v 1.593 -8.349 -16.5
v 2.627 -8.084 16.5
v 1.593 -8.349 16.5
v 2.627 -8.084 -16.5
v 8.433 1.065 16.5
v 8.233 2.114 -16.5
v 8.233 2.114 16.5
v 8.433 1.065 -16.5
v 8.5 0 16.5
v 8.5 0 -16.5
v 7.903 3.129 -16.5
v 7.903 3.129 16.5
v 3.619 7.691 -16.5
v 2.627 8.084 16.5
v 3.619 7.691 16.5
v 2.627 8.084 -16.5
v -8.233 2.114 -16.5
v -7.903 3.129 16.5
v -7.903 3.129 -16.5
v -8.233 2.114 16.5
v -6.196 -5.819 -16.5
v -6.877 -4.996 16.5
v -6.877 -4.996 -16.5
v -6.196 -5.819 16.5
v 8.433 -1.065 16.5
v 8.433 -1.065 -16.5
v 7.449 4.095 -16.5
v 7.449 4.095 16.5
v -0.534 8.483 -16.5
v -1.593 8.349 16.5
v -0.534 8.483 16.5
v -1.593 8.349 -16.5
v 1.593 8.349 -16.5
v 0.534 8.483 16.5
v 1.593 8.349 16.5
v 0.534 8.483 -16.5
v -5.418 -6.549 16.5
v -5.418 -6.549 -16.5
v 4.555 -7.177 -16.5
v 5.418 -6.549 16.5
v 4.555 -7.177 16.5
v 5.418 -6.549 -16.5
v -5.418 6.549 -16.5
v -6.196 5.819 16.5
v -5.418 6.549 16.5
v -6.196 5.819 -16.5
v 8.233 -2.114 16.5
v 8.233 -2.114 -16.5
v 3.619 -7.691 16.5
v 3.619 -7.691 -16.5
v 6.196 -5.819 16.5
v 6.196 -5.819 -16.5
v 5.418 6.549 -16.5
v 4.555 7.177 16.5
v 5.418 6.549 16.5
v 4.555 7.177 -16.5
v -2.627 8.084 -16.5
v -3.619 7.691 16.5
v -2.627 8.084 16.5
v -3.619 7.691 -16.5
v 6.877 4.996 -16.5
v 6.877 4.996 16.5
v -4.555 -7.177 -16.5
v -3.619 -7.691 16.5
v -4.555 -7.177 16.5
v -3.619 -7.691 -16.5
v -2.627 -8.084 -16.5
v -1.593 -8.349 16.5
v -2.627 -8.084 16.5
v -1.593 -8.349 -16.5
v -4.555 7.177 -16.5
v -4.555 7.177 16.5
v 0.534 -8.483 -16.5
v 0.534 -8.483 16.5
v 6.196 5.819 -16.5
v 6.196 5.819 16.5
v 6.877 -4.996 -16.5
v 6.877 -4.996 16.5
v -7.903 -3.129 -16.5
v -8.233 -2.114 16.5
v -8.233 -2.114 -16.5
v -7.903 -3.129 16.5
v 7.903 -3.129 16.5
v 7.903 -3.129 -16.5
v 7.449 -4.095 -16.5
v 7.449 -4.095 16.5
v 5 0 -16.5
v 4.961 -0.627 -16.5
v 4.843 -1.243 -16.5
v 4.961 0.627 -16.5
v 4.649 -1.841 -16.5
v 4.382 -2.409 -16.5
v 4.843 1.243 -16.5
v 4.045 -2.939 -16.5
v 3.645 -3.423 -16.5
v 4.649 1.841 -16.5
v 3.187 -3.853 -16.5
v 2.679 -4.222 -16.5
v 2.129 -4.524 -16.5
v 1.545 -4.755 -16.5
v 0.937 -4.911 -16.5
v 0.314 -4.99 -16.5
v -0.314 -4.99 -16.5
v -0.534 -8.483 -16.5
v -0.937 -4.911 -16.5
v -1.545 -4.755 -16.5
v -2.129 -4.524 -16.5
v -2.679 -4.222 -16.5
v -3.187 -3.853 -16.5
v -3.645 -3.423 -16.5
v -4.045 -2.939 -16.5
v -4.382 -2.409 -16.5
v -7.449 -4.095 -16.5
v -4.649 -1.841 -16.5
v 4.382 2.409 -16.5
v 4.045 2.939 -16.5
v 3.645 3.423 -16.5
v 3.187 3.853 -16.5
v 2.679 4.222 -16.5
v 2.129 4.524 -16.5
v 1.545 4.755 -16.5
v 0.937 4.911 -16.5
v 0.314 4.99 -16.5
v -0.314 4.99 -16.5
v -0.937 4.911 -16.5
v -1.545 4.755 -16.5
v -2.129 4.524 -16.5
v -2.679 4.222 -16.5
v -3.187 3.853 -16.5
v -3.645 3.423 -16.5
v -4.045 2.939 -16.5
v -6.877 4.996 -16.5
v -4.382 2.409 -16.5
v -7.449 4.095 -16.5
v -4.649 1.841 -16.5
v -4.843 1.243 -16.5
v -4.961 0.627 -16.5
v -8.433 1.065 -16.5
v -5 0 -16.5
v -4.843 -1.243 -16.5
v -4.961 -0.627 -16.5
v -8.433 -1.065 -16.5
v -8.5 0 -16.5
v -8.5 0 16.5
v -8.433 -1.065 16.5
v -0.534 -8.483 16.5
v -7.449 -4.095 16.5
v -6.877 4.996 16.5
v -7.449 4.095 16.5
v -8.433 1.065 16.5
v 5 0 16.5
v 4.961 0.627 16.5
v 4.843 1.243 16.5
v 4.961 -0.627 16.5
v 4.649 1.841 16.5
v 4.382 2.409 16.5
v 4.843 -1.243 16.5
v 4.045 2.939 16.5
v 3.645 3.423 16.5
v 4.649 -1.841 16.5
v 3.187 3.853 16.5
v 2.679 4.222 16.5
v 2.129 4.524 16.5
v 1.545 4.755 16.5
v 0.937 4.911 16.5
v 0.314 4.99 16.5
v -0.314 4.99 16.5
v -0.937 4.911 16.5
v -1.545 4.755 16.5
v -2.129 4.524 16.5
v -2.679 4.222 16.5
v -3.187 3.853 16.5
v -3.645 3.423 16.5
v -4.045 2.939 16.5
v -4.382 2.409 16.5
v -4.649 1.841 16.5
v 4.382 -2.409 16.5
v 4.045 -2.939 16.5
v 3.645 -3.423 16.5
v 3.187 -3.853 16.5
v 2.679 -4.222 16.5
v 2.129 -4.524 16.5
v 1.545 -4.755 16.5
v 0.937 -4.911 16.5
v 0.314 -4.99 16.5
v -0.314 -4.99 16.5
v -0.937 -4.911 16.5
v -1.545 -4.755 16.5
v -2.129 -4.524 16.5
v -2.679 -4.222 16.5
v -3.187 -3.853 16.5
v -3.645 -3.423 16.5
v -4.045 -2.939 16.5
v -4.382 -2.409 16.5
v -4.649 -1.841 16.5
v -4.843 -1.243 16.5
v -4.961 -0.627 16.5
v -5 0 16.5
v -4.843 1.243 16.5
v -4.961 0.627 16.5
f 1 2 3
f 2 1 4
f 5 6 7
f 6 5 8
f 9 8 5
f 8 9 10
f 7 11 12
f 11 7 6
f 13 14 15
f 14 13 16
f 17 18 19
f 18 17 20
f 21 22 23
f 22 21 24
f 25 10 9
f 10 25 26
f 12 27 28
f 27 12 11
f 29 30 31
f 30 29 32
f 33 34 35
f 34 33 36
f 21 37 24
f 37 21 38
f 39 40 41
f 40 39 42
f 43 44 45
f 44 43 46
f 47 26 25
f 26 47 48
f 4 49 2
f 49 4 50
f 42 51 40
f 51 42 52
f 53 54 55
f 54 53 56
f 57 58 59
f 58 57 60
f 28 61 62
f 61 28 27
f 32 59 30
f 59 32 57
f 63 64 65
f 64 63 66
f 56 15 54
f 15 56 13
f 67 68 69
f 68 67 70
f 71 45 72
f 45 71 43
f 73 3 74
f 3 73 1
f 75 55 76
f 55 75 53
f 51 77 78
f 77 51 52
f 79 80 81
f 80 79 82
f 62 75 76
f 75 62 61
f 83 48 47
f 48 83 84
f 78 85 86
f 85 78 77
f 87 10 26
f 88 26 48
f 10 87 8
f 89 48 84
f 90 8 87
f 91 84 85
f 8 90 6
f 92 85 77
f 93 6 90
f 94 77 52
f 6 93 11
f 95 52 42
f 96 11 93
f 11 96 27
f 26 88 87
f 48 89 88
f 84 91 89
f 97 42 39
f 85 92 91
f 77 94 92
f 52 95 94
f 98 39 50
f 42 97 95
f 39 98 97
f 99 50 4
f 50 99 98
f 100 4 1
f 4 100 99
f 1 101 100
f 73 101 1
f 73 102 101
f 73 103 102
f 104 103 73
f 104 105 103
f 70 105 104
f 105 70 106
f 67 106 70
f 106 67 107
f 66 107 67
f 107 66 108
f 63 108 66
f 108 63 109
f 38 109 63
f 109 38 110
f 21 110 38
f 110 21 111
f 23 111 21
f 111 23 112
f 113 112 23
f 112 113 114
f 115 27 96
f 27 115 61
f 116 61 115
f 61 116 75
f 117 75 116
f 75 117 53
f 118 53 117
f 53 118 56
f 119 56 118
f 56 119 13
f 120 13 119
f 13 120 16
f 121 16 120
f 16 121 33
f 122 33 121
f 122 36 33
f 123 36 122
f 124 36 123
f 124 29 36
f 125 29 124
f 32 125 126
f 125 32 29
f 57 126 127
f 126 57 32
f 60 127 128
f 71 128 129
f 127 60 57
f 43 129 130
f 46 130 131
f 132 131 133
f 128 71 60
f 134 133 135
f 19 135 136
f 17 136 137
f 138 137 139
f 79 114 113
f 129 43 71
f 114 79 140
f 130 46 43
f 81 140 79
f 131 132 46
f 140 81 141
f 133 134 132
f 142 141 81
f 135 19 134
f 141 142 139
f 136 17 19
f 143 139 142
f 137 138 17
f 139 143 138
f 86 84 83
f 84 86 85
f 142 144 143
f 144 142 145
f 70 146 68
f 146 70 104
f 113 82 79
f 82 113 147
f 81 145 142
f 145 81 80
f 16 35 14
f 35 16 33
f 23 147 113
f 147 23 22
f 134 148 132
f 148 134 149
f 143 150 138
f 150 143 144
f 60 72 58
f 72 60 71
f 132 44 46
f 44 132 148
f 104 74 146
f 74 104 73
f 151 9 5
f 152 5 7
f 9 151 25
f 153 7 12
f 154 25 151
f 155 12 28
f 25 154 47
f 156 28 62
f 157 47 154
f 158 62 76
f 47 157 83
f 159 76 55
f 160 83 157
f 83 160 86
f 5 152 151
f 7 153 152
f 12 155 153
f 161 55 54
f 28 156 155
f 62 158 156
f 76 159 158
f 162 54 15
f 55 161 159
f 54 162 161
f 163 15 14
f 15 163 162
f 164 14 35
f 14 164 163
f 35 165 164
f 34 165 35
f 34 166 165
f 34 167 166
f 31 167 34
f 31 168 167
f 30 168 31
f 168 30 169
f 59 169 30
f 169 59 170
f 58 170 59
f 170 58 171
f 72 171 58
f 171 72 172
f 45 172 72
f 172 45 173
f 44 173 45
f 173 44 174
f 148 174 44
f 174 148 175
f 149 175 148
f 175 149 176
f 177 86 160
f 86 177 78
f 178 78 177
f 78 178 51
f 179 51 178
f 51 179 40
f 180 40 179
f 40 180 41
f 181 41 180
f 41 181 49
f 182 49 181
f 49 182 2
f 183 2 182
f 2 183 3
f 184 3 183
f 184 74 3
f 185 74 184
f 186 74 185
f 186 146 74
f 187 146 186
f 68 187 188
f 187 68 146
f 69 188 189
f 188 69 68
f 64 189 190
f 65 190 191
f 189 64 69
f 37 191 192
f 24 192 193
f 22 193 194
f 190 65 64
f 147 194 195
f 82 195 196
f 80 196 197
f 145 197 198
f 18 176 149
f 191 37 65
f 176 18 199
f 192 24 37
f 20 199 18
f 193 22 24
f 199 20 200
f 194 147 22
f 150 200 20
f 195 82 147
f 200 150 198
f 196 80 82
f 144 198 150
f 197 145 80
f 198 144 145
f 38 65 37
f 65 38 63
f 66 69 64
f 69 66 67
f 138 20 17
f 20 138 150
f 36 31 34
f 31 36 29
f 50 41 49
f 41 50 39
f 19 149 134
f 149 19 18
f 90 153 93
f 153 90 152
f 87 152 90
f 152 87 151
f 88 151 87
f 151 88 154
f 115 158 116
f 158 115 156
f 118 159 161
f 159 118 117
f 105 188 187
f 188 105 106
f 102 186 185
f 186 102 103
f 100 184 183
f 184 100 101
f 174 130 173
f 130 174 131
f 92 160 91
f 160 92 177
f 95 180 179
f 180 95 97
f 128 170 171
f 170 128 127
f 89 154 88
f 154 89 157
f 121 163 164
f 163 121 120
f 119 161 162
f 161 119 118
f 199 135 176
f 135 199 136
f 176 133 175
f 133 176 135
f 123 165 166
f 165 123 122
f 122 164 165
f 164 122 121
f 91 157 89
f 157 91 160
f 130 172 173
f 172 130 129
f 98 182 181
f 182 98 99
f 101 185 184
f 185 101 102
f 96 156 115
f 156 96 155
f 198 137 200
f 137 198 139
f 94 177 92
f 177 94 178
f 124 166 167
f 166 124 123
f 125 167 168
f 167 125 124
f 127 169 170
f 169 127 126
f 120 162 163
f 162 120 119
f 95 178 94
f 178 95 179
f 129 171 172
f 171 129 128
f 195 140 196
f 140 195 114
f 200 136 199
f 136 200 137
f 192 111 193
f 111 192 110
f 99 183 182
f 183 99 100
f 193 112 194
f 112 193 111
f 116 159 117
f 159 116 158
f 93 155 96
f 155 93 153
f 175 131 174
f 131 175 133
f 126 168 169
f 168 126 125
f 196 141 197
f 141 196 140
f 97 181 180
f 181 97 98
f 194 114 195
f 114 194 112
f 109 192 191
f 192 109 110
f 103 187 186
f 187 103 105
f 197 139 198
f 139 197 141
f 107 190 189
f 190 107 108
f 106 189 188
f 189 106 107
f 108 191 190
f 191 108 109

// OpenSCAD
$fn = 50;


difference() {
	union() {
		translate(v = [0, 0, -16.5000000000]) {
			cylinder(h = 33, r = 8.5000000000);
		}
	}
	union() {
		translate(v = [0, 0, -100.0000000000]) {
			cylinder(h = 200, r = 5.0000000000);
		}
	}
}
